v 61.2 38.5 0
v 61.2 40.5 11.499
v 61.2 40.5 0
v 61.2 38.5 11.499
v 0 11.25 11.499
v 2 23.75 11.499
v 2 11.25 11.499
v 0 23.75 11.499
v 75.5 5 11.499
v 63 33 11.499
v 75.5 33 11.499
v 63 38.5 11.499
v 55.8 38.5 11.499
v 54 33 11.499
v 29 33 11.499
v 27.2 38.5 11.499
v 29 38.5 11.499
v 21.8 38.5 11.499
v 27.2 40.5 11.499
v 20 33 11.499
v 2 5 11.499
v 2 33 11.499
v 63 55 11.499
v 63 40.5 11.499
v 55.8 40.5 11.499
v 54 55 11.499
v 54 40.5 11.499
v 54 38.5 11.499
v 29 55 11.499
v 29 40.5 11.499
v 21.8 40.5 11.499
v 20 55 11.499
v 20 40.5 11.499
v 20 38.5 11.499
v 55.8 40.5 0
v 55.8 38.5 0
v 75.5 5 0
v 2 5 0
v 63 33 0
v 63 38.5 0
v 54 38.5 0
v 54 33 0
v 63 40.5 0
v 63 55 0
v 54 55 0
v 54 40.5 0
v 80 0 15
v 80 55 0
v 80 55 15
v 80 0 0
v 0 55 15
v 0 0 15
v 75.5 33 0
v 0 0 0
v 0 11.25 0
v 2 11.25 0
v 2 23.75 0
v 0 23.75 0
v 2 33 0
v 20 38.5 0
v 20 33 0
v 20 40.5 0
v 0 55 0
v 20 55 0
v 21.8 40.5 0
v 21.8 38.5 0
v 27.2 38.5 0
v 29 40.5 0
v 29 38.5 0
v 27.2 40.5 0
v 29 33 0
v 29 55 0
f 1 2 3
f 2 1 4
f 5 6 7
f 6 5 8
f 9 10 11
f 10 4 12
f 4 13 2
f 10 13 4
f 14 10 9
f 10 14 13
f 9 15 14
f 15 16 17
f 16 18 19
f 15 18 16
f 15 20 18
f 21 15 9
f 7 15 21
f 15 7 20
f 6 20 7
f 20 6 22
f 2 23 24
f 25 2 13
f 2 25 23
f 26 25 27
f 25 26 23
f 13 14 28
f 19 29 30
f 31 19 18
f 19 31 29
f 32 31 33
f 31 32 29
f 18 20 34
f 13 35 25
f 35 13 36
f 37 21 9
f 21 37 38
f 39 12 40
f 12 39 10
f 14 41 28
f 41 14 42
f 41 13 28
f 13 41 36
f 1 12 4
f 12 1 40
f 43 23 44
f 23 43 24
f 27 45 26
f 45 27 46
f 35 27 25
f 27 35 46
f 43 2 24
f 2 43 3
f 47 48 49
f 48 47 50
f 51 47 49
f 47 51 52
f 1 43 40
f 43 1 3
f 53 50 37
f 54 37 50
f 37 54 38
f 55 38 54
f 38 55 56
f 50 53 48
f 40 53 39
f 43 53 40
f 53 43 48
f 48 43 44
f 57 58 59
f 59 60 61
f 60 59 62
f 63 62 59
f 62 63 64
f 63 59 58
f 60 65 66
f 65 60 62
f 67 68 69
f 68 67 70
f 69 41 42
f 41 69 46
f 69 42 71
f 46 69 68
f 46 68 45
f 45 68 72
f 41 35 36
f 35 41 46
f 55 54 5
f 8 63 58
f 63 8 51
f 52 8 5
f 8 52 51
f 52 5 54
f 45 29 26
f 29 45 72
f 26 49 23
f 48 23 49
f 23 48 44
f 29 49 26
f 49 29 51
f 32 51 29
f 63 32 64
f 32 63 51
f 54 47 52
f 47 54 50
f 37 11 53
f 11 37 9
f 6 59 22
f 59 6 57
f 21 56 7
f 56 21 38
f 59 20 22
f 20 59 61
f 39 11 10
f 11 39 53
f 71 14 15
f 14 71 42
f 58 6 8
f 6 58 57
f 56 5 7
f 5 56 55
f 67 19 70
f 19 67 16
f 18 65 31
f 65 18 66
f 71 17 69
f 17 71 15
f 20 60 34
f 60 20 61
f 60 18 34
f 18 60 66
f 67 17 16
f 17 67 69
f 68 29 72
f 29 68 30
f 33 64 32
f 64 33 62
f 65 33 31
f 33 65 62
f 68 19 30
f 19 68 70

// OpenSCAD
width = 55;
length = 80;
height = 15;

sticklength=73.5;
stickwidth = 28;
stickheight=11.5;

wholewallthickness = 5;
thinwallthickness = 2;

antennacenterfromusbend = 22.5;

usbwidth = 12.5;

connectorminthickness = 5.4;
connectormaxhickness = 9;
connectorgroovefrombody= 5.5;
connectorgroovethickness = 2;

connectordistance = 34;



difference() {
  
    
union() {
  //base
  cube([ length,width,height]);
}
//body
translate([thinwallthickness, wholewallthickness, -0.001])
  cube([sticklength, stickwidth, stickheight]);
//usb
translate([-0.001, wholewallthickness + usbwidth/2, -0.001])
  cube([10, usbwidth, stickheight]);

//1st antenna
translate([thinwallthickness + antennacenterfromusbend - connectorminthickness / 2, wholewallthickness, -0.001])
  cube([connectorminthickness, 1000, stickheight]);

translate([thinwallthickness + antennacenterfromusbend - connectormaxhickness / 2, wholewallthickness, -0.001])
  cube([connectormaxhickness, stickwidth + connectorgroovefrombody, stickheight]);
translate([thinwallthickness + antennacenterfromusbend - connectormaxhickness / 2, wholewallthickness + stickwidth + connectorgroovefrombody + connectorgroovethickness, -0.001])
  cube([connectormaxhickness, 1000, stickheight]);


//2nd antenna
translate([connectordistance, 0, 0])
  union() {
translate([thinwallthickness + antennacenterfromusbend - connectorminthickness / 2, wholewallthickness, -0.001])
  cube([connectorminthickness, 1000, stickheight]);

translate([thinwallthickness + antennacenterfromusbend + - connectormaxhickness / 2, wholewallthickness, -0.001])
  cube([connectormaxhickness, stickwidth + connectorgroovefrombody, stickheight]);
translate([thinwallthickness + antennacenterfromusbend - connectormaxhickness / 2, wholewallthickness + stickwidth + connectorgroovefrombody + connectorgroovethickness, -0.001])
  cube([connectormaxhickness, 1000, stickheight]);
  }
}
